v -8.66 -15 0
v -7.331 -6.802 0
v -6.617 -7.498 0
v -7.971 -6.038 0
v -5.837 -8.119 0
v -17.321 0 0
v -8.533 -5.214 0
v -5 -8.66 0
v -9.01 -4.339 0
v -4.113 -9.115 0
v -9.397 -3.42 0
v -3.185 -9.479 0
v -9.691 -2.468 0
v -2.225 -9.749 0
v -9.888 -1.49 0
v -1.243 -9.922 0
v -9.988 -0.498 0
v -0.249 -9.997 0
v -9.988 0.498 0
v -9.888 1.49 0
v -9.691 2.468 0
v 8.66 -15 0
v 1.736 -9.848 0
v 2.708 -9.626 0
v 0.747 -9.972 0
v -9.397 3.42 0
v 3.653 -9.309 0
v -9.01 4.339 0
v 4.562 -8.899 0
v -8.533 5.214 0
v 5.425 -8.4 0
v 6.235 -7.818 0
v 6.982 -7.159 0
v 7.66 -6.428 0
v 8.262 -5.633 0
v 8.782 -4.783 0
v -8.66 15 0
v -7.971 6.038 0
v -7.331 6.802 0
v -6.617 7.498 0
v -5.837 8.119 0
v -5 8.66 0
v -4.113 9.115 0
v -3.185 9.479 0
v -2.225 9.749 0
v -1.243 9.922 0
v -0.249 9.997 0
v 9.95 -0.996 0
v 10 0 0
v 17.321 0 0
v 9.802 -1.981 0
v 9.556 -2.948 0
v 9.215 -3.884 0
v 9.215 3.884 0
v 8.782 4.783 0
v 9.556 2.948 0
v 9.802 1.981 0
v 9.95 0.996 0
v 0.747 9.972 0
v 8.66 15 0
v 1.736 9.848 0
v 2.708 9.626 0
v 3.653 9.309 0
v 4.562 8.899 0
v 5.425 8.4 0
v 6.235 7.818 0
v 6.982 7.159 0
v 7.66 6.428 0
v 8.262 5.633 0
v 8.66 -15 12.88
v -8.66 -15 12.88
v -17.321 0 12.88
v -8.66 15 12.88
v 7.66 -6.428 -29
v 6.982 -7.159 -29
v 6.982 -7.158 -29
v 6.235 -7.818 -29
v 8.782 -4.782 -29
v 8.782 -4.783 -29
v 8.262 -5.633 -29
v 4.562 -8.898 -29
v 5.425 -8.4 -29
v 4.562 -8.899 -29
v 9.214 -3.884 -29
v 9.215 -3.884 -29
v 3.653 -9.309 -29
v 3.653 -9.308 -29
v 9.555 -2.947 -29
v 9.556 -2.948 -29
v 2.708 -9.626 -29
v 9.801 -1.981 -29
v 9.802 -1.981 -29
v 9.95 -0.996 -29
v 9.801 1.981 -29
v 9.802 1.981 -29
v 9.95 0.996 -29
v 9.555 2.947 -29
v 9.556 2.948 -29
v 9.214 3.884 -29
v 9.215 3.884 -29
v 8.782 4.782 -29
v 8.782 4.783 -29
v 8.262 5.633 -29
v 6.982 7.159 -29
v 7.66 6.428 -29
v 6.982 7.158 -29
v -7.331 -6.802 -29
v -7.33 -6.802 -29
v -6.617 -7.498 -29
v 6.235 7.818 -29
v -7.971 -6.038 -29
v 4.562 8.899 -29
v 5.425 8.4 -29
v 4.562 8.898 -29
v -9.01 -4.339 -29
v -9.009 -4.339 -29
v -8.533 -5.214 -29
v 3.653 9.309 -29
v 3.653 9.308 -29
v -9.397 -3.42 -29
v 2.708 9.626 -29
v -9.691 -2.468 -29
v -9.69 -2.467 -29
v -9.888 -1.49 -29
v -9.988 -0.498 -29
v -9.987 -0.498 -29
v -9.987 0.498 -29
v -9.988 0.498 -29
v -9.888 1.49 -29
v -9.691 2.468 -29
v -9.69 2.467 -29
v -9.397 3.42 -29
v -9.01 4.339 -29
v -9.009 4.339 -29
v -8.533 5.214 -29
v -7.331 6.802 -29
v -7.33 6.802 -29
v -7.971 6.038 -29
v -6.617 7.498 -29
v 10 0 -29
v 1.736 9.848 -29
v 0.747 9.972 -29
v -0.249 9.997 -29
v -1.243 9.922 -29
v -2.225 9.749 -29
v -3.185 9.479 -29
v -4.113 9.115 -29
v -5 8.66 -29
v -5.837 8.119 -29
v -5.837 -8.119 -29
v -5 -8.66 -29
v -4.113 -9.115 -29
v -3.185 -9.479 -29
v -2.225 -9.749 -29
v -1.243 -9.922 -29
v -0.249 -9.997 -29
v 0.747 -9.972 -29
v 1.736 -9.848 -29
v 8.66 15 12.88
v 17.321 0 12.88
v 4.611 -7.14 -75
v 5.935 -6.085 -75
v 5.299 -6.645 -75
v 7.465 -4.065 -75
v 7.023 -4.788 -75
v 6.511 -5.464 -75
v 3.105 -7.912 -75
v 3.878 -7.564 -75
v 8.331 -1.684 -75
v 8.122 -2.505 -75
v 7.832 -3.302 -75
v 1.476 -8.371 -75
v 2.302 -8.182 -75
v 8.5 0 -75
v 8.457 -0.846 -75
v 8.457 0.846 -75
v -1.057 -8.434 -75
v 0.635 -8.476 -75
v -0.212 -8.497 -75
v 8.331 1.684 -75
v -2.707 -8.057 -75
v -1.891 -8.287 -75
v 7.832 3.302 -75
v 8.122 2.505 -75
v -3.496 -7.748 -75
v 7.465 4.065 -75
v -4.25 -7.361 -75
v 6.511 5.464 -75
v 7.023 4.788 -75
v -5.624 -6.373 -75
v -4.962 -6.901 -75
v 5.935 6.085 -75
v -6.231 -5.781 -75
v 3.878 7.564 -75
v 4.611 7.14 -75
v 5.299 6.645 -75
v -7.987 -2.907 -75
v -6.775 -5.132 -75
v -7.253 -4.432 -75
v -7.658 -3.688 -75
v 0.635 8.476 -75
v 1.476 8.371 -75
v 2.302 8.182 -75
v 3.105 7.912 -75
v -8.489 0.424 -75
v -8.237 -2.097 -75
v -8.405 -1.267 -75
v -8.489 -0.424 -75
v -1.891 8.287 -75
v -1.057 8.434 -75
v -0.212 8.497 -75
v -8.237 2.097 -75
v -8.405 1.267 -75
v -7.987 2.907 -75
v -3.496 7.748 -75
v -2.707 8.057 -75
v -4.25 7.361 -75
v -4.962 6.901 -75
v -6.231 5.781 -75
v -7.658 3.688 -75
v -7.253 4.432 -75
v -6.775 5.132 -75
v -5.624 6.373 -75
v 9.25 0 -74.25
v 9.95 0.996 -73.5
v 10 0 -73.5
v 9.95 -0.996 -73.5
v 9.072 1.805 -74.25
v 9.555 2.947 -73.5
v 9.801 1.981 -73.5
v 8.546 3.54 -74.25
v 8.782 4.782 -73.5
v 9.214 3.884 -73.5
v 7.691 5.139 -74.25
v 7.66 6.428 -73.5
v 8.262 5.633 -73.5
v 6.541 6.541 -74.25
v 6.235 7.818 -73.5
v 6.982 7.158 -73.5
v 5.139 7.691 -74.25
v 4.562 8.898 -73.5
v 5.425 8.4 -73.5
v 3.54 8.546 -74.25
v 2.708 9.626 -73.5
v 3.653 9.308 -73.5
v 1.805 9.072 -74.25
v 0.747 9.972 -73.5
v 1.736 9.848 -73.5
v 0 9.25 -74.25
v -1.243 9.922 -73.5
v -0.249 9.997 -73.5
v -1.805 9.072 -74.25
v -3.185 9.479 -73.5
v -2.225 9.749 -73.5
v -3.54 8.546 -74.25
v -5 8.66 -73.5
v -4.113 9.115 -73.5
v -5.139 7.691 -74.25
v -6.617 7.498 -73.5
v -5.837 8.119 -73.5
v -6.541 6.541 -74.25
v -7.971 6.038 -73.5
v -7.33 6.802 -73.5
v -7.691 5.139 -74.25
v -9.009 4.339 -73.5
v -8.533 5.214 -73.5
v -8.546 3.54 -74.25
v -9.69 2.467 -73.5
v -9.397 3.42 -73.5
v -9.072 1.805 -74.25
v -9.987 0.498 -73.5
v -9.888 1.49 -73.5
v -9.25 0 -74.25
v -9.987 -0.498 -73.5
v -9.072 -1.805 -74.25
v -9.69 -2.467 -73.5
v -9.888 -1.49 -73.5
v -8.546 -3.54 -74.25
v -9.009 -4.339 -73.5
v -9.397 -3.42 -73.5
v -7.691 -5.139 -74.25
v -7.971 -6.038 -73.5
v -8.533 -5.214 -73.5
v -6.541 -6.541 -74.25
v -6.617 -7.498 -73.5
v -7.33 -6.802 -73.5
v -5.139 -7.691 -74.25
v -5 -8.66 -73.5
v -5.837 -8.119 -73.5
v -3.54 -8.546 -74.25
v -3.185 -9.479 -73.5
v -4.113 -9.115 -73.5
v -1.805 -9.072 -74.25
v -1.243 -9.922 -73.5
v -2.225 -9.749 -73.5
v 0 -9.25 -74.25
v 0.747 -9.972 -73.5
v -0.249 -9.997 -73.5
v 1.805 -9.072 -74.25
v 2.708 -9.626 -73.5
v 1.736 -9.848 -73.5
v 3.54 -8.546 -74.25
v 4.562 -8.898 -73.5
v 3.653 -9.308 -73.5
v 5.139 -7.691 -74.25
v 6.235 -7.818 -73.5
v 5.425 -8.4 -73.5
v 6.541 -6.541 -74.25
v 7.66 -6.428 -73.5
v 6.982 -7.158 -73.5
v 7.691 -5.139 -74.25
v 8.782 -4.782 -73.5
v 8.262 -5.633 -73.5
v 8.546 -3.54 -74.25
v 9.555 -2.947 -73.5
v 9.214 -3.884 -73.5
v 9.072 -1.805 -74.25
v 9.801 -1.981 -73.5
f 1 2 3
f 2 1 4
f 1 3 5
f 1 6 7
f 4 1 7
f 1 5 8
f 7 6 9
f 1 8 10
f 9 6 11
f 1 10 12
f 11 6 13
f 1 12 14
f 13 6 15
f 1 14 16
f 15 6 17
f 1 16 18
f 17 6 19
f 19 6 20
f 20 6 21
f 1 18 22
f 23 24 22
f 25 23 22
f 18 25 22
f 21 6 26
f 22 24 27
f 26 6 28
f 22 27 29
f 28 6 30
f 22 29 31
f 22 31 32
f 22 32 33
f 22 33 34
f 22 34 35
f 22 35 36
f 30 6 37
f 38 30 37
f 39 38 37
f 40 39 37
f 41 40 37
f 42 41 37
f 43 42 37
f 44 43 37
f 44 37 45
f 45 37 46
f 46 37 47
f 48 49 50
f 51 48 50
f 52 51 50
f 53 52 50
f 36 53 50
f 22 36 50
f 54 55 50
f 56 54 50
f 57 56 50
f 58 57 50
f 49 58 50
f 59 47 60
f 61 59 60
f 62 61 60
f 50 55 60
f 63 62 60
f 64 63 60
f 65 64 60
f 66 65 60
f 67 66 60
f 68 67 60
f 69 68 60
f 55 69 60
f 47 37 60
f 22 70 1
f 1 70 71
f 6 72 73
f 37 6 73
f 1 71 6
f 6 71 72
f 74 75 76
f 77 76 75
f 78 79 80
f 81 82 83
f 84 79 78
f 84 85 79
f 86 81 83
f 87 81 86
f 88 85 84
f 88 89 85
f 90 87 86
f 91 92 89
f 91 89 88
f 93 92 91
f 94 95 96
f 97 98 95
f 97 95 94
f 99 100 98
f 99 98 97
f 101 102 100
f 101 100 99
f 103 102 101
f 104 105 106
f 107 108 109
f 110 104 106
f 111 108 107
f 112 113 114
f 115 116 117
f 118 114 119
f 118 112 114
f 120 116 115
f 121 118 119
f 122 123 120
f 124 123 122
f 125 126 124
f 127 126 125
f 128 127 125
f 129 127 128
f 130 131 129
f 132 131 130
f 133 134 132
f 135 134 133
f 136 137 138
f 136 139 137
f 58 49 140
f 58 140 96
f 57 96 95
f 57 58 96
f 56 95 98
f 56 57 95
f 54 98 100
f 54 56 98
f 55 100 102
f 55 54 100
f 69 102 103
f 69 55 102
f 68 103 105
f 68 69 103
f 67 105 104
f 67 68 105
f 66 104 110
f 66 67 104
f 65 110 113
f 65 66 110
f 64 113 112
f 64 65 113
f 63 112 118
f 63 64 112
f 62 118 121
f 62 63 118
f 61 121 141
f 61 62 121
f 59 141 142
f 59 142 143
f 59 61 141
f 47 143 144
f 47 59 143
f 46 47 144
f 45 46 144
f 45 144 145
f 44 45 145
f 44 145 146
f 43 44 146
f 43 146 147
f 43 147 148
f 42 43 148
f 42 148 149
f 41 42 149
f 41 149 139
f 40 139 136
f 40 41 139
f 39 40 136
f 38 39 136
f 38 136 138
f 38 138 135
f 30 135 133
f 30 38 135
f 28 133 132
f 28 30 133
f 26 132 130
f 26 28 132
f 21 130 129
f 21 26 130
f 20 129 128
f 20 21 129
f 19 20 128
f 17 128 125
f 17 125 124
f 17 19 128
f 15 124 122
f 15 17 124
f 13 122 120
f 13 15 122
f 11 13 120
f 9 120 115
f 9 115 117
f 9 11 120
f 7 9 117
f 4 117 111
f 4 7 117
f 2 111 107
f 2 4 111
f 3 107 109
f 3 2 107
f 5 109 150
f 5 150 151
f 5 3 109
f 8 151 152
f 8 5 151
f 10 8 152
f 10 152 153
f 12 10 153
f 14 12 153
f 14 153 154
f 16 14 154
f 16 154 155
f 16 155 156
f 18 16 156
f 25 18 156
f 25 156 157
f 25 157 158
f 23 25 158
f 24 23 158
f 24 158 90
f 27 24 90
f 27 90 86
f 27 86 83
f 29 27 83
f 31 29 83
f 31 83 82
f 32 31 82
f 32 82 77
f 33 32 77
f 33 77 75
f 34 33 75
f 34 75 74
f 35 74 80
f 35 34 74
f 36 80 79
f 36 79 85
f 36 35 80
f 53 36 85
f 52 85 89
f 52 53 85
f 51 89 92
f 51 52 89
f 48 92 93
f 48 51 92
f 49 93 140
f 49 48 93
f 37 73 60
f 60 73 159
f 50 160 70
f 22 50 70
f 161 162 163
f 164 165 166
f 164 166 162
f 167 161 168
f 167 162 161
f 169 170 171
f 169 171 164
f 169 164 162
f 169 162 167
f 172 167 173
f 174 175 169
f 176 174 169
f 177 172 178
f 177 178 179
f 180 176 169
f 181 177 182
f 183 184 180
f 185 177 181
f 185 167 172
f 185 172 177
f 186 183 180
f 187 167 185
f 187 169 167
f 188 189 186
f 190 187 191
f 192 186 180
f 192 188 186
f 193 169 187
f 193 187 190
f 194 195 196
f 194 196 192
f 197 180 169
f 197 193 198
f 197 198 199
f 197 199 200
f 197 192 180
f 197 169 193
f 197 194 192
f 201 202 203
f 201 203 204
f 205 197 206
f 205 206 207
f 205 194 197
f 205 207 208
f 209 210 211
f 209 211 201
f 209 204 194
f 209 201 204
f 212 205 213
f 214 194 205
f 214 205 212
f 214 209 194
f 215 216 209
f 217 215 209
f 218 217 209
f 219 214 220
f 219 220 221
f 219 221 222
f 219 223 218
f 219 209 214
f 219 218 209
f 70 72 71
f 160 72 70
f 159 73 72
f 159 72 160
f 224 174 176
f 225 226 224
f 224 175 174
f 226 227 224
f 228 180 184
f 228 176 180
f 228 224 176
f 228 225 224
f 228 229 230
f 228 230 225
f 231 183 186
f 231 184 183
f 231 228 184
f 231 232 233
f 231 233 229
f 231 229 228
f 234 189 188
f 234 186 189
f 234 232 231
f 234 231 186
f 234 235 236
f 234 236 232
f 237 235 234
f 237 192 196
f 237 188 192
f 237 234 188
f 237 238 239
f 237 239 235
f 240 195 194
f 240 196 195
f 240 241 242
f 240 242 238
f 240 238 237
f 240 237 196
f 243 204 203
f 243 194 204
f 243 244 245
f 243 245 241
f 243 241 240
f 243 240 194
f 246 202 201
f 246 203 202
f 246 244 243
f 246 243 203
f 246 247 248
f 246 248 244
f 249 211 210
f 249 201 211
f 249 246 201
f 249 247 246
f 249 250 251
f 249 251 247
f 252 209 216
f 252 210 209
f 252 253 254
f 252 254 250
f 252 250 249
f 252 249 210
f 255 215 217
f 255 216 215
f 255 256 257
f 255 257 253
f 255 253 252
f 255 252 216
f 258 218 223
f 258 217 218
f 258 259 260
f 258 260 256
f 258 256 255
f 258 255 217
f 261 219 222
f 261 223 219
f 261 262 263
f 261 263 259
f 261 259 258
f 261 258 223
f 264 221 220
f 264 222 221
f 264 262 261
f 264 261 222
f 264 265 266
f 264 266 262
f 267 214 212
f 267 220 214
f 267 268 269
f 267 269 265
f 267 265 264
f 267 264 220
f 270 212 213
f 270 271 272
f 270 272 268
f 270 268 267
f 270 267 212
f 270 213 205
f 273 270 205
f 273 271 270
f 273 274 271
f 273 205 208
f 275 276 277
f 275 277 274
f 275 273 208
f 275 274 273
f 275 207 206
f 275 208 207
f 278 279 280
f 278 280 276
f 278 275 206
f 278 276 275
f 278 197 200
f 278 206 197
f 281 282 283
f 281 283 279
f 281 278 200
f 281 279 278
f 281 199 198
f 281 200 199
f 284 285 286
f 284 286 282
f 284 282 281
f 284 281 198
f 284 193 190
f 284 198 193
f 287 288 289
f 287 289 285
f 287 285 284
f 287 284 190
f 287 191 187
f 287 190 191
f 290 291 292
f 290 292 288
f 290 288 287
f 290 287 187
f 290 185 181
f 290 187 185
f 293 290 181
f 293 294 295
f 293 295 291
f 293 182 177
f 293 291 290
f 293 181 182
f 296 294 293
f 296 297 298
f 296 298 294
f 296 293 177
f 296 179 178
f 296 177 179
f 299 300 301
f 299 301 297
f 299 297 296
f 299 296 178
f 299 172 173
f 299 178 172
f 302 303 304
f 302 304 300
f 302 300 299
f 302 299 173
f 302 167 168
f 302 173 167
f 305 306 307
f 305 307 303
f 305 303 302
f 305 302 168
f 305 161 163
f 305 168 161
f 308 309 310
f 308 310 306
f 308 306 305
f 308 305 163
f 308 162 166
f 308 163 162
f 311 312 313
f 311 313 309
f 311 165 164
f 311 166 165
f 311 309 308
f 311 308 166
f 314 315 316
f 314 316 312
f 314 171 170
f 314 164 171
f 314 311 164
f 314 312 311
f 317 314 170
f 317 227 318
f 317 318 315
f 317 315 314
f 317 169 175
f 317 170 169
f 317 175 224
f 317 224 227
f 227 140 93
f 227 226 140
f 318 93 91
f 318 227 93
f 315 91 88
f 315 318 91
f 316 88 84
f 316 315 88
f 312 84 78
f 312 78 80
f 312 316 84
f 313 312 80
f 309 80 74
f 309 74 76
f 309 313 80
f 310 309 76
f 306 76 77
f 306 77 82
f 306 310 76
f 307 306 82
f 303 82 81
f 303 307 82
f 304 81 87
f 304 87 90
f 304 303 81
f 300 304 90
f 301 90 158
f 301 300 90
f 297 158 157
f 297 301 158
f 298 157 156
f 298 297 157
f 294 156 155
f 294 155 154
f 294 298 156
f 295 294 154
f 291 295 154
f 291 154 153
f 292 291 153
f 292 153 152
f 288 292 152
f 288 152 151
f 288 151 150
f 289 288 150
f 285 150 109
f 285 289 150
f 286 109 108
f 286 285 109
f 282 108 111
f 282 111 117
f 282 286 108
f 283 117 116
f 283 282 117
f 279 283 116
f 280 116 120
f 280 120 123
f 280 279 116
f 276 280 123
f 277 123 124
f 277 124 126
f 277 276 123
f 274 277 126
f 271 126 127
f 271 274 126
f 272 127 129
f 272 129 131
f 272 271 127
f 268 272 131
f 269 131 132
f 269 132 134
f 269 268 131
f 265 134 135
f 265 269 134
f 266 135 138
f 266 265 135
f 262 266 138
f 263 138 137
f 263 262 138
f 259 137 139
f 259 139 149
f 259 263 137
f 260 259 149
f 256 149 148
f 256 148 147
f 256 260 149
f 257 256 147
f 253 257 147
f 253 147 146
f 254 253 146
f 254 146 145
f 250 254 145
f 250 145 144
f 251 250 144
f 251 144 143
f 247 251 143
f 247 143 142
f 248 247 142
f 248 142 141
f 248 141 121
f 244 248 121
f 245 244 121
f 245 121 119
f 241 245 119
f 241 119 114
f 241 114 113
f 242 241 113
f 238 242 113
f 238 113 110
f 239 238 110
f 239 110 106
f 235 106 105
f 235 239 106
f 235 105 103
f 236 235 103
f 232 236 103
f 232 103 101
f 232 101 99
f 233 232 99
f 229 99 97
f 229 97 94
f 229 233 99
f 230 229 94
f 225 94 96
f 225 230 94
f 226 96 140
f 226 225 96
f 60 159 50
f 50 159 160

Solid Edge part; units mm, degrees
sketch "Sketch1" plane through (0, 0, 0) normal (0, 0, 1) x (1, 0, 0)
  circle A0 centre (0, 0) radius 17.4
  dimension "D1" = 34.8
extrude "Protrusion1" add sketch "Sketch1" along normal blind 12.88
sketch "Sketch2" plane through (0, 0, 0) normal (0, 0, -1) x (1, 0, 0)
  circle A0 centre (0, 0) radius 10
extrude "Protrusion2" add sketch "Sketch2" along normal blind 75
sketch "Sketch3" plane through (0, 0, -75) normal (0, 0, -1) x (1, 0, 0)
  circle A0 centre (0, 0) radius 9.9997
extrude "Cutout1" cut sketch "Sketch3" against normal blind 46 flip side to cut
chamfer "Chamfer_1" distance 1.5 angle 45 1 edges at (-9.9997, 0, -75)
sketch "Sketch4" plane through (0, 0, 12.88) normal (0, 0, 1) x (1, 0, 0)
  line L0 (-8.8182, 15) -> (8.8182, 15)
  dimension "D1" = 30
extrude "Cutout2" cut sketch "Sketch4" against normal up to next material side at (0, 15.05, 12.88)
pattern_circular "Pattern1" count 6 over 360 about axis through (0, 0, 12.88) along (0, 0, 1) of "Cutout2"
properties part number "185588"
